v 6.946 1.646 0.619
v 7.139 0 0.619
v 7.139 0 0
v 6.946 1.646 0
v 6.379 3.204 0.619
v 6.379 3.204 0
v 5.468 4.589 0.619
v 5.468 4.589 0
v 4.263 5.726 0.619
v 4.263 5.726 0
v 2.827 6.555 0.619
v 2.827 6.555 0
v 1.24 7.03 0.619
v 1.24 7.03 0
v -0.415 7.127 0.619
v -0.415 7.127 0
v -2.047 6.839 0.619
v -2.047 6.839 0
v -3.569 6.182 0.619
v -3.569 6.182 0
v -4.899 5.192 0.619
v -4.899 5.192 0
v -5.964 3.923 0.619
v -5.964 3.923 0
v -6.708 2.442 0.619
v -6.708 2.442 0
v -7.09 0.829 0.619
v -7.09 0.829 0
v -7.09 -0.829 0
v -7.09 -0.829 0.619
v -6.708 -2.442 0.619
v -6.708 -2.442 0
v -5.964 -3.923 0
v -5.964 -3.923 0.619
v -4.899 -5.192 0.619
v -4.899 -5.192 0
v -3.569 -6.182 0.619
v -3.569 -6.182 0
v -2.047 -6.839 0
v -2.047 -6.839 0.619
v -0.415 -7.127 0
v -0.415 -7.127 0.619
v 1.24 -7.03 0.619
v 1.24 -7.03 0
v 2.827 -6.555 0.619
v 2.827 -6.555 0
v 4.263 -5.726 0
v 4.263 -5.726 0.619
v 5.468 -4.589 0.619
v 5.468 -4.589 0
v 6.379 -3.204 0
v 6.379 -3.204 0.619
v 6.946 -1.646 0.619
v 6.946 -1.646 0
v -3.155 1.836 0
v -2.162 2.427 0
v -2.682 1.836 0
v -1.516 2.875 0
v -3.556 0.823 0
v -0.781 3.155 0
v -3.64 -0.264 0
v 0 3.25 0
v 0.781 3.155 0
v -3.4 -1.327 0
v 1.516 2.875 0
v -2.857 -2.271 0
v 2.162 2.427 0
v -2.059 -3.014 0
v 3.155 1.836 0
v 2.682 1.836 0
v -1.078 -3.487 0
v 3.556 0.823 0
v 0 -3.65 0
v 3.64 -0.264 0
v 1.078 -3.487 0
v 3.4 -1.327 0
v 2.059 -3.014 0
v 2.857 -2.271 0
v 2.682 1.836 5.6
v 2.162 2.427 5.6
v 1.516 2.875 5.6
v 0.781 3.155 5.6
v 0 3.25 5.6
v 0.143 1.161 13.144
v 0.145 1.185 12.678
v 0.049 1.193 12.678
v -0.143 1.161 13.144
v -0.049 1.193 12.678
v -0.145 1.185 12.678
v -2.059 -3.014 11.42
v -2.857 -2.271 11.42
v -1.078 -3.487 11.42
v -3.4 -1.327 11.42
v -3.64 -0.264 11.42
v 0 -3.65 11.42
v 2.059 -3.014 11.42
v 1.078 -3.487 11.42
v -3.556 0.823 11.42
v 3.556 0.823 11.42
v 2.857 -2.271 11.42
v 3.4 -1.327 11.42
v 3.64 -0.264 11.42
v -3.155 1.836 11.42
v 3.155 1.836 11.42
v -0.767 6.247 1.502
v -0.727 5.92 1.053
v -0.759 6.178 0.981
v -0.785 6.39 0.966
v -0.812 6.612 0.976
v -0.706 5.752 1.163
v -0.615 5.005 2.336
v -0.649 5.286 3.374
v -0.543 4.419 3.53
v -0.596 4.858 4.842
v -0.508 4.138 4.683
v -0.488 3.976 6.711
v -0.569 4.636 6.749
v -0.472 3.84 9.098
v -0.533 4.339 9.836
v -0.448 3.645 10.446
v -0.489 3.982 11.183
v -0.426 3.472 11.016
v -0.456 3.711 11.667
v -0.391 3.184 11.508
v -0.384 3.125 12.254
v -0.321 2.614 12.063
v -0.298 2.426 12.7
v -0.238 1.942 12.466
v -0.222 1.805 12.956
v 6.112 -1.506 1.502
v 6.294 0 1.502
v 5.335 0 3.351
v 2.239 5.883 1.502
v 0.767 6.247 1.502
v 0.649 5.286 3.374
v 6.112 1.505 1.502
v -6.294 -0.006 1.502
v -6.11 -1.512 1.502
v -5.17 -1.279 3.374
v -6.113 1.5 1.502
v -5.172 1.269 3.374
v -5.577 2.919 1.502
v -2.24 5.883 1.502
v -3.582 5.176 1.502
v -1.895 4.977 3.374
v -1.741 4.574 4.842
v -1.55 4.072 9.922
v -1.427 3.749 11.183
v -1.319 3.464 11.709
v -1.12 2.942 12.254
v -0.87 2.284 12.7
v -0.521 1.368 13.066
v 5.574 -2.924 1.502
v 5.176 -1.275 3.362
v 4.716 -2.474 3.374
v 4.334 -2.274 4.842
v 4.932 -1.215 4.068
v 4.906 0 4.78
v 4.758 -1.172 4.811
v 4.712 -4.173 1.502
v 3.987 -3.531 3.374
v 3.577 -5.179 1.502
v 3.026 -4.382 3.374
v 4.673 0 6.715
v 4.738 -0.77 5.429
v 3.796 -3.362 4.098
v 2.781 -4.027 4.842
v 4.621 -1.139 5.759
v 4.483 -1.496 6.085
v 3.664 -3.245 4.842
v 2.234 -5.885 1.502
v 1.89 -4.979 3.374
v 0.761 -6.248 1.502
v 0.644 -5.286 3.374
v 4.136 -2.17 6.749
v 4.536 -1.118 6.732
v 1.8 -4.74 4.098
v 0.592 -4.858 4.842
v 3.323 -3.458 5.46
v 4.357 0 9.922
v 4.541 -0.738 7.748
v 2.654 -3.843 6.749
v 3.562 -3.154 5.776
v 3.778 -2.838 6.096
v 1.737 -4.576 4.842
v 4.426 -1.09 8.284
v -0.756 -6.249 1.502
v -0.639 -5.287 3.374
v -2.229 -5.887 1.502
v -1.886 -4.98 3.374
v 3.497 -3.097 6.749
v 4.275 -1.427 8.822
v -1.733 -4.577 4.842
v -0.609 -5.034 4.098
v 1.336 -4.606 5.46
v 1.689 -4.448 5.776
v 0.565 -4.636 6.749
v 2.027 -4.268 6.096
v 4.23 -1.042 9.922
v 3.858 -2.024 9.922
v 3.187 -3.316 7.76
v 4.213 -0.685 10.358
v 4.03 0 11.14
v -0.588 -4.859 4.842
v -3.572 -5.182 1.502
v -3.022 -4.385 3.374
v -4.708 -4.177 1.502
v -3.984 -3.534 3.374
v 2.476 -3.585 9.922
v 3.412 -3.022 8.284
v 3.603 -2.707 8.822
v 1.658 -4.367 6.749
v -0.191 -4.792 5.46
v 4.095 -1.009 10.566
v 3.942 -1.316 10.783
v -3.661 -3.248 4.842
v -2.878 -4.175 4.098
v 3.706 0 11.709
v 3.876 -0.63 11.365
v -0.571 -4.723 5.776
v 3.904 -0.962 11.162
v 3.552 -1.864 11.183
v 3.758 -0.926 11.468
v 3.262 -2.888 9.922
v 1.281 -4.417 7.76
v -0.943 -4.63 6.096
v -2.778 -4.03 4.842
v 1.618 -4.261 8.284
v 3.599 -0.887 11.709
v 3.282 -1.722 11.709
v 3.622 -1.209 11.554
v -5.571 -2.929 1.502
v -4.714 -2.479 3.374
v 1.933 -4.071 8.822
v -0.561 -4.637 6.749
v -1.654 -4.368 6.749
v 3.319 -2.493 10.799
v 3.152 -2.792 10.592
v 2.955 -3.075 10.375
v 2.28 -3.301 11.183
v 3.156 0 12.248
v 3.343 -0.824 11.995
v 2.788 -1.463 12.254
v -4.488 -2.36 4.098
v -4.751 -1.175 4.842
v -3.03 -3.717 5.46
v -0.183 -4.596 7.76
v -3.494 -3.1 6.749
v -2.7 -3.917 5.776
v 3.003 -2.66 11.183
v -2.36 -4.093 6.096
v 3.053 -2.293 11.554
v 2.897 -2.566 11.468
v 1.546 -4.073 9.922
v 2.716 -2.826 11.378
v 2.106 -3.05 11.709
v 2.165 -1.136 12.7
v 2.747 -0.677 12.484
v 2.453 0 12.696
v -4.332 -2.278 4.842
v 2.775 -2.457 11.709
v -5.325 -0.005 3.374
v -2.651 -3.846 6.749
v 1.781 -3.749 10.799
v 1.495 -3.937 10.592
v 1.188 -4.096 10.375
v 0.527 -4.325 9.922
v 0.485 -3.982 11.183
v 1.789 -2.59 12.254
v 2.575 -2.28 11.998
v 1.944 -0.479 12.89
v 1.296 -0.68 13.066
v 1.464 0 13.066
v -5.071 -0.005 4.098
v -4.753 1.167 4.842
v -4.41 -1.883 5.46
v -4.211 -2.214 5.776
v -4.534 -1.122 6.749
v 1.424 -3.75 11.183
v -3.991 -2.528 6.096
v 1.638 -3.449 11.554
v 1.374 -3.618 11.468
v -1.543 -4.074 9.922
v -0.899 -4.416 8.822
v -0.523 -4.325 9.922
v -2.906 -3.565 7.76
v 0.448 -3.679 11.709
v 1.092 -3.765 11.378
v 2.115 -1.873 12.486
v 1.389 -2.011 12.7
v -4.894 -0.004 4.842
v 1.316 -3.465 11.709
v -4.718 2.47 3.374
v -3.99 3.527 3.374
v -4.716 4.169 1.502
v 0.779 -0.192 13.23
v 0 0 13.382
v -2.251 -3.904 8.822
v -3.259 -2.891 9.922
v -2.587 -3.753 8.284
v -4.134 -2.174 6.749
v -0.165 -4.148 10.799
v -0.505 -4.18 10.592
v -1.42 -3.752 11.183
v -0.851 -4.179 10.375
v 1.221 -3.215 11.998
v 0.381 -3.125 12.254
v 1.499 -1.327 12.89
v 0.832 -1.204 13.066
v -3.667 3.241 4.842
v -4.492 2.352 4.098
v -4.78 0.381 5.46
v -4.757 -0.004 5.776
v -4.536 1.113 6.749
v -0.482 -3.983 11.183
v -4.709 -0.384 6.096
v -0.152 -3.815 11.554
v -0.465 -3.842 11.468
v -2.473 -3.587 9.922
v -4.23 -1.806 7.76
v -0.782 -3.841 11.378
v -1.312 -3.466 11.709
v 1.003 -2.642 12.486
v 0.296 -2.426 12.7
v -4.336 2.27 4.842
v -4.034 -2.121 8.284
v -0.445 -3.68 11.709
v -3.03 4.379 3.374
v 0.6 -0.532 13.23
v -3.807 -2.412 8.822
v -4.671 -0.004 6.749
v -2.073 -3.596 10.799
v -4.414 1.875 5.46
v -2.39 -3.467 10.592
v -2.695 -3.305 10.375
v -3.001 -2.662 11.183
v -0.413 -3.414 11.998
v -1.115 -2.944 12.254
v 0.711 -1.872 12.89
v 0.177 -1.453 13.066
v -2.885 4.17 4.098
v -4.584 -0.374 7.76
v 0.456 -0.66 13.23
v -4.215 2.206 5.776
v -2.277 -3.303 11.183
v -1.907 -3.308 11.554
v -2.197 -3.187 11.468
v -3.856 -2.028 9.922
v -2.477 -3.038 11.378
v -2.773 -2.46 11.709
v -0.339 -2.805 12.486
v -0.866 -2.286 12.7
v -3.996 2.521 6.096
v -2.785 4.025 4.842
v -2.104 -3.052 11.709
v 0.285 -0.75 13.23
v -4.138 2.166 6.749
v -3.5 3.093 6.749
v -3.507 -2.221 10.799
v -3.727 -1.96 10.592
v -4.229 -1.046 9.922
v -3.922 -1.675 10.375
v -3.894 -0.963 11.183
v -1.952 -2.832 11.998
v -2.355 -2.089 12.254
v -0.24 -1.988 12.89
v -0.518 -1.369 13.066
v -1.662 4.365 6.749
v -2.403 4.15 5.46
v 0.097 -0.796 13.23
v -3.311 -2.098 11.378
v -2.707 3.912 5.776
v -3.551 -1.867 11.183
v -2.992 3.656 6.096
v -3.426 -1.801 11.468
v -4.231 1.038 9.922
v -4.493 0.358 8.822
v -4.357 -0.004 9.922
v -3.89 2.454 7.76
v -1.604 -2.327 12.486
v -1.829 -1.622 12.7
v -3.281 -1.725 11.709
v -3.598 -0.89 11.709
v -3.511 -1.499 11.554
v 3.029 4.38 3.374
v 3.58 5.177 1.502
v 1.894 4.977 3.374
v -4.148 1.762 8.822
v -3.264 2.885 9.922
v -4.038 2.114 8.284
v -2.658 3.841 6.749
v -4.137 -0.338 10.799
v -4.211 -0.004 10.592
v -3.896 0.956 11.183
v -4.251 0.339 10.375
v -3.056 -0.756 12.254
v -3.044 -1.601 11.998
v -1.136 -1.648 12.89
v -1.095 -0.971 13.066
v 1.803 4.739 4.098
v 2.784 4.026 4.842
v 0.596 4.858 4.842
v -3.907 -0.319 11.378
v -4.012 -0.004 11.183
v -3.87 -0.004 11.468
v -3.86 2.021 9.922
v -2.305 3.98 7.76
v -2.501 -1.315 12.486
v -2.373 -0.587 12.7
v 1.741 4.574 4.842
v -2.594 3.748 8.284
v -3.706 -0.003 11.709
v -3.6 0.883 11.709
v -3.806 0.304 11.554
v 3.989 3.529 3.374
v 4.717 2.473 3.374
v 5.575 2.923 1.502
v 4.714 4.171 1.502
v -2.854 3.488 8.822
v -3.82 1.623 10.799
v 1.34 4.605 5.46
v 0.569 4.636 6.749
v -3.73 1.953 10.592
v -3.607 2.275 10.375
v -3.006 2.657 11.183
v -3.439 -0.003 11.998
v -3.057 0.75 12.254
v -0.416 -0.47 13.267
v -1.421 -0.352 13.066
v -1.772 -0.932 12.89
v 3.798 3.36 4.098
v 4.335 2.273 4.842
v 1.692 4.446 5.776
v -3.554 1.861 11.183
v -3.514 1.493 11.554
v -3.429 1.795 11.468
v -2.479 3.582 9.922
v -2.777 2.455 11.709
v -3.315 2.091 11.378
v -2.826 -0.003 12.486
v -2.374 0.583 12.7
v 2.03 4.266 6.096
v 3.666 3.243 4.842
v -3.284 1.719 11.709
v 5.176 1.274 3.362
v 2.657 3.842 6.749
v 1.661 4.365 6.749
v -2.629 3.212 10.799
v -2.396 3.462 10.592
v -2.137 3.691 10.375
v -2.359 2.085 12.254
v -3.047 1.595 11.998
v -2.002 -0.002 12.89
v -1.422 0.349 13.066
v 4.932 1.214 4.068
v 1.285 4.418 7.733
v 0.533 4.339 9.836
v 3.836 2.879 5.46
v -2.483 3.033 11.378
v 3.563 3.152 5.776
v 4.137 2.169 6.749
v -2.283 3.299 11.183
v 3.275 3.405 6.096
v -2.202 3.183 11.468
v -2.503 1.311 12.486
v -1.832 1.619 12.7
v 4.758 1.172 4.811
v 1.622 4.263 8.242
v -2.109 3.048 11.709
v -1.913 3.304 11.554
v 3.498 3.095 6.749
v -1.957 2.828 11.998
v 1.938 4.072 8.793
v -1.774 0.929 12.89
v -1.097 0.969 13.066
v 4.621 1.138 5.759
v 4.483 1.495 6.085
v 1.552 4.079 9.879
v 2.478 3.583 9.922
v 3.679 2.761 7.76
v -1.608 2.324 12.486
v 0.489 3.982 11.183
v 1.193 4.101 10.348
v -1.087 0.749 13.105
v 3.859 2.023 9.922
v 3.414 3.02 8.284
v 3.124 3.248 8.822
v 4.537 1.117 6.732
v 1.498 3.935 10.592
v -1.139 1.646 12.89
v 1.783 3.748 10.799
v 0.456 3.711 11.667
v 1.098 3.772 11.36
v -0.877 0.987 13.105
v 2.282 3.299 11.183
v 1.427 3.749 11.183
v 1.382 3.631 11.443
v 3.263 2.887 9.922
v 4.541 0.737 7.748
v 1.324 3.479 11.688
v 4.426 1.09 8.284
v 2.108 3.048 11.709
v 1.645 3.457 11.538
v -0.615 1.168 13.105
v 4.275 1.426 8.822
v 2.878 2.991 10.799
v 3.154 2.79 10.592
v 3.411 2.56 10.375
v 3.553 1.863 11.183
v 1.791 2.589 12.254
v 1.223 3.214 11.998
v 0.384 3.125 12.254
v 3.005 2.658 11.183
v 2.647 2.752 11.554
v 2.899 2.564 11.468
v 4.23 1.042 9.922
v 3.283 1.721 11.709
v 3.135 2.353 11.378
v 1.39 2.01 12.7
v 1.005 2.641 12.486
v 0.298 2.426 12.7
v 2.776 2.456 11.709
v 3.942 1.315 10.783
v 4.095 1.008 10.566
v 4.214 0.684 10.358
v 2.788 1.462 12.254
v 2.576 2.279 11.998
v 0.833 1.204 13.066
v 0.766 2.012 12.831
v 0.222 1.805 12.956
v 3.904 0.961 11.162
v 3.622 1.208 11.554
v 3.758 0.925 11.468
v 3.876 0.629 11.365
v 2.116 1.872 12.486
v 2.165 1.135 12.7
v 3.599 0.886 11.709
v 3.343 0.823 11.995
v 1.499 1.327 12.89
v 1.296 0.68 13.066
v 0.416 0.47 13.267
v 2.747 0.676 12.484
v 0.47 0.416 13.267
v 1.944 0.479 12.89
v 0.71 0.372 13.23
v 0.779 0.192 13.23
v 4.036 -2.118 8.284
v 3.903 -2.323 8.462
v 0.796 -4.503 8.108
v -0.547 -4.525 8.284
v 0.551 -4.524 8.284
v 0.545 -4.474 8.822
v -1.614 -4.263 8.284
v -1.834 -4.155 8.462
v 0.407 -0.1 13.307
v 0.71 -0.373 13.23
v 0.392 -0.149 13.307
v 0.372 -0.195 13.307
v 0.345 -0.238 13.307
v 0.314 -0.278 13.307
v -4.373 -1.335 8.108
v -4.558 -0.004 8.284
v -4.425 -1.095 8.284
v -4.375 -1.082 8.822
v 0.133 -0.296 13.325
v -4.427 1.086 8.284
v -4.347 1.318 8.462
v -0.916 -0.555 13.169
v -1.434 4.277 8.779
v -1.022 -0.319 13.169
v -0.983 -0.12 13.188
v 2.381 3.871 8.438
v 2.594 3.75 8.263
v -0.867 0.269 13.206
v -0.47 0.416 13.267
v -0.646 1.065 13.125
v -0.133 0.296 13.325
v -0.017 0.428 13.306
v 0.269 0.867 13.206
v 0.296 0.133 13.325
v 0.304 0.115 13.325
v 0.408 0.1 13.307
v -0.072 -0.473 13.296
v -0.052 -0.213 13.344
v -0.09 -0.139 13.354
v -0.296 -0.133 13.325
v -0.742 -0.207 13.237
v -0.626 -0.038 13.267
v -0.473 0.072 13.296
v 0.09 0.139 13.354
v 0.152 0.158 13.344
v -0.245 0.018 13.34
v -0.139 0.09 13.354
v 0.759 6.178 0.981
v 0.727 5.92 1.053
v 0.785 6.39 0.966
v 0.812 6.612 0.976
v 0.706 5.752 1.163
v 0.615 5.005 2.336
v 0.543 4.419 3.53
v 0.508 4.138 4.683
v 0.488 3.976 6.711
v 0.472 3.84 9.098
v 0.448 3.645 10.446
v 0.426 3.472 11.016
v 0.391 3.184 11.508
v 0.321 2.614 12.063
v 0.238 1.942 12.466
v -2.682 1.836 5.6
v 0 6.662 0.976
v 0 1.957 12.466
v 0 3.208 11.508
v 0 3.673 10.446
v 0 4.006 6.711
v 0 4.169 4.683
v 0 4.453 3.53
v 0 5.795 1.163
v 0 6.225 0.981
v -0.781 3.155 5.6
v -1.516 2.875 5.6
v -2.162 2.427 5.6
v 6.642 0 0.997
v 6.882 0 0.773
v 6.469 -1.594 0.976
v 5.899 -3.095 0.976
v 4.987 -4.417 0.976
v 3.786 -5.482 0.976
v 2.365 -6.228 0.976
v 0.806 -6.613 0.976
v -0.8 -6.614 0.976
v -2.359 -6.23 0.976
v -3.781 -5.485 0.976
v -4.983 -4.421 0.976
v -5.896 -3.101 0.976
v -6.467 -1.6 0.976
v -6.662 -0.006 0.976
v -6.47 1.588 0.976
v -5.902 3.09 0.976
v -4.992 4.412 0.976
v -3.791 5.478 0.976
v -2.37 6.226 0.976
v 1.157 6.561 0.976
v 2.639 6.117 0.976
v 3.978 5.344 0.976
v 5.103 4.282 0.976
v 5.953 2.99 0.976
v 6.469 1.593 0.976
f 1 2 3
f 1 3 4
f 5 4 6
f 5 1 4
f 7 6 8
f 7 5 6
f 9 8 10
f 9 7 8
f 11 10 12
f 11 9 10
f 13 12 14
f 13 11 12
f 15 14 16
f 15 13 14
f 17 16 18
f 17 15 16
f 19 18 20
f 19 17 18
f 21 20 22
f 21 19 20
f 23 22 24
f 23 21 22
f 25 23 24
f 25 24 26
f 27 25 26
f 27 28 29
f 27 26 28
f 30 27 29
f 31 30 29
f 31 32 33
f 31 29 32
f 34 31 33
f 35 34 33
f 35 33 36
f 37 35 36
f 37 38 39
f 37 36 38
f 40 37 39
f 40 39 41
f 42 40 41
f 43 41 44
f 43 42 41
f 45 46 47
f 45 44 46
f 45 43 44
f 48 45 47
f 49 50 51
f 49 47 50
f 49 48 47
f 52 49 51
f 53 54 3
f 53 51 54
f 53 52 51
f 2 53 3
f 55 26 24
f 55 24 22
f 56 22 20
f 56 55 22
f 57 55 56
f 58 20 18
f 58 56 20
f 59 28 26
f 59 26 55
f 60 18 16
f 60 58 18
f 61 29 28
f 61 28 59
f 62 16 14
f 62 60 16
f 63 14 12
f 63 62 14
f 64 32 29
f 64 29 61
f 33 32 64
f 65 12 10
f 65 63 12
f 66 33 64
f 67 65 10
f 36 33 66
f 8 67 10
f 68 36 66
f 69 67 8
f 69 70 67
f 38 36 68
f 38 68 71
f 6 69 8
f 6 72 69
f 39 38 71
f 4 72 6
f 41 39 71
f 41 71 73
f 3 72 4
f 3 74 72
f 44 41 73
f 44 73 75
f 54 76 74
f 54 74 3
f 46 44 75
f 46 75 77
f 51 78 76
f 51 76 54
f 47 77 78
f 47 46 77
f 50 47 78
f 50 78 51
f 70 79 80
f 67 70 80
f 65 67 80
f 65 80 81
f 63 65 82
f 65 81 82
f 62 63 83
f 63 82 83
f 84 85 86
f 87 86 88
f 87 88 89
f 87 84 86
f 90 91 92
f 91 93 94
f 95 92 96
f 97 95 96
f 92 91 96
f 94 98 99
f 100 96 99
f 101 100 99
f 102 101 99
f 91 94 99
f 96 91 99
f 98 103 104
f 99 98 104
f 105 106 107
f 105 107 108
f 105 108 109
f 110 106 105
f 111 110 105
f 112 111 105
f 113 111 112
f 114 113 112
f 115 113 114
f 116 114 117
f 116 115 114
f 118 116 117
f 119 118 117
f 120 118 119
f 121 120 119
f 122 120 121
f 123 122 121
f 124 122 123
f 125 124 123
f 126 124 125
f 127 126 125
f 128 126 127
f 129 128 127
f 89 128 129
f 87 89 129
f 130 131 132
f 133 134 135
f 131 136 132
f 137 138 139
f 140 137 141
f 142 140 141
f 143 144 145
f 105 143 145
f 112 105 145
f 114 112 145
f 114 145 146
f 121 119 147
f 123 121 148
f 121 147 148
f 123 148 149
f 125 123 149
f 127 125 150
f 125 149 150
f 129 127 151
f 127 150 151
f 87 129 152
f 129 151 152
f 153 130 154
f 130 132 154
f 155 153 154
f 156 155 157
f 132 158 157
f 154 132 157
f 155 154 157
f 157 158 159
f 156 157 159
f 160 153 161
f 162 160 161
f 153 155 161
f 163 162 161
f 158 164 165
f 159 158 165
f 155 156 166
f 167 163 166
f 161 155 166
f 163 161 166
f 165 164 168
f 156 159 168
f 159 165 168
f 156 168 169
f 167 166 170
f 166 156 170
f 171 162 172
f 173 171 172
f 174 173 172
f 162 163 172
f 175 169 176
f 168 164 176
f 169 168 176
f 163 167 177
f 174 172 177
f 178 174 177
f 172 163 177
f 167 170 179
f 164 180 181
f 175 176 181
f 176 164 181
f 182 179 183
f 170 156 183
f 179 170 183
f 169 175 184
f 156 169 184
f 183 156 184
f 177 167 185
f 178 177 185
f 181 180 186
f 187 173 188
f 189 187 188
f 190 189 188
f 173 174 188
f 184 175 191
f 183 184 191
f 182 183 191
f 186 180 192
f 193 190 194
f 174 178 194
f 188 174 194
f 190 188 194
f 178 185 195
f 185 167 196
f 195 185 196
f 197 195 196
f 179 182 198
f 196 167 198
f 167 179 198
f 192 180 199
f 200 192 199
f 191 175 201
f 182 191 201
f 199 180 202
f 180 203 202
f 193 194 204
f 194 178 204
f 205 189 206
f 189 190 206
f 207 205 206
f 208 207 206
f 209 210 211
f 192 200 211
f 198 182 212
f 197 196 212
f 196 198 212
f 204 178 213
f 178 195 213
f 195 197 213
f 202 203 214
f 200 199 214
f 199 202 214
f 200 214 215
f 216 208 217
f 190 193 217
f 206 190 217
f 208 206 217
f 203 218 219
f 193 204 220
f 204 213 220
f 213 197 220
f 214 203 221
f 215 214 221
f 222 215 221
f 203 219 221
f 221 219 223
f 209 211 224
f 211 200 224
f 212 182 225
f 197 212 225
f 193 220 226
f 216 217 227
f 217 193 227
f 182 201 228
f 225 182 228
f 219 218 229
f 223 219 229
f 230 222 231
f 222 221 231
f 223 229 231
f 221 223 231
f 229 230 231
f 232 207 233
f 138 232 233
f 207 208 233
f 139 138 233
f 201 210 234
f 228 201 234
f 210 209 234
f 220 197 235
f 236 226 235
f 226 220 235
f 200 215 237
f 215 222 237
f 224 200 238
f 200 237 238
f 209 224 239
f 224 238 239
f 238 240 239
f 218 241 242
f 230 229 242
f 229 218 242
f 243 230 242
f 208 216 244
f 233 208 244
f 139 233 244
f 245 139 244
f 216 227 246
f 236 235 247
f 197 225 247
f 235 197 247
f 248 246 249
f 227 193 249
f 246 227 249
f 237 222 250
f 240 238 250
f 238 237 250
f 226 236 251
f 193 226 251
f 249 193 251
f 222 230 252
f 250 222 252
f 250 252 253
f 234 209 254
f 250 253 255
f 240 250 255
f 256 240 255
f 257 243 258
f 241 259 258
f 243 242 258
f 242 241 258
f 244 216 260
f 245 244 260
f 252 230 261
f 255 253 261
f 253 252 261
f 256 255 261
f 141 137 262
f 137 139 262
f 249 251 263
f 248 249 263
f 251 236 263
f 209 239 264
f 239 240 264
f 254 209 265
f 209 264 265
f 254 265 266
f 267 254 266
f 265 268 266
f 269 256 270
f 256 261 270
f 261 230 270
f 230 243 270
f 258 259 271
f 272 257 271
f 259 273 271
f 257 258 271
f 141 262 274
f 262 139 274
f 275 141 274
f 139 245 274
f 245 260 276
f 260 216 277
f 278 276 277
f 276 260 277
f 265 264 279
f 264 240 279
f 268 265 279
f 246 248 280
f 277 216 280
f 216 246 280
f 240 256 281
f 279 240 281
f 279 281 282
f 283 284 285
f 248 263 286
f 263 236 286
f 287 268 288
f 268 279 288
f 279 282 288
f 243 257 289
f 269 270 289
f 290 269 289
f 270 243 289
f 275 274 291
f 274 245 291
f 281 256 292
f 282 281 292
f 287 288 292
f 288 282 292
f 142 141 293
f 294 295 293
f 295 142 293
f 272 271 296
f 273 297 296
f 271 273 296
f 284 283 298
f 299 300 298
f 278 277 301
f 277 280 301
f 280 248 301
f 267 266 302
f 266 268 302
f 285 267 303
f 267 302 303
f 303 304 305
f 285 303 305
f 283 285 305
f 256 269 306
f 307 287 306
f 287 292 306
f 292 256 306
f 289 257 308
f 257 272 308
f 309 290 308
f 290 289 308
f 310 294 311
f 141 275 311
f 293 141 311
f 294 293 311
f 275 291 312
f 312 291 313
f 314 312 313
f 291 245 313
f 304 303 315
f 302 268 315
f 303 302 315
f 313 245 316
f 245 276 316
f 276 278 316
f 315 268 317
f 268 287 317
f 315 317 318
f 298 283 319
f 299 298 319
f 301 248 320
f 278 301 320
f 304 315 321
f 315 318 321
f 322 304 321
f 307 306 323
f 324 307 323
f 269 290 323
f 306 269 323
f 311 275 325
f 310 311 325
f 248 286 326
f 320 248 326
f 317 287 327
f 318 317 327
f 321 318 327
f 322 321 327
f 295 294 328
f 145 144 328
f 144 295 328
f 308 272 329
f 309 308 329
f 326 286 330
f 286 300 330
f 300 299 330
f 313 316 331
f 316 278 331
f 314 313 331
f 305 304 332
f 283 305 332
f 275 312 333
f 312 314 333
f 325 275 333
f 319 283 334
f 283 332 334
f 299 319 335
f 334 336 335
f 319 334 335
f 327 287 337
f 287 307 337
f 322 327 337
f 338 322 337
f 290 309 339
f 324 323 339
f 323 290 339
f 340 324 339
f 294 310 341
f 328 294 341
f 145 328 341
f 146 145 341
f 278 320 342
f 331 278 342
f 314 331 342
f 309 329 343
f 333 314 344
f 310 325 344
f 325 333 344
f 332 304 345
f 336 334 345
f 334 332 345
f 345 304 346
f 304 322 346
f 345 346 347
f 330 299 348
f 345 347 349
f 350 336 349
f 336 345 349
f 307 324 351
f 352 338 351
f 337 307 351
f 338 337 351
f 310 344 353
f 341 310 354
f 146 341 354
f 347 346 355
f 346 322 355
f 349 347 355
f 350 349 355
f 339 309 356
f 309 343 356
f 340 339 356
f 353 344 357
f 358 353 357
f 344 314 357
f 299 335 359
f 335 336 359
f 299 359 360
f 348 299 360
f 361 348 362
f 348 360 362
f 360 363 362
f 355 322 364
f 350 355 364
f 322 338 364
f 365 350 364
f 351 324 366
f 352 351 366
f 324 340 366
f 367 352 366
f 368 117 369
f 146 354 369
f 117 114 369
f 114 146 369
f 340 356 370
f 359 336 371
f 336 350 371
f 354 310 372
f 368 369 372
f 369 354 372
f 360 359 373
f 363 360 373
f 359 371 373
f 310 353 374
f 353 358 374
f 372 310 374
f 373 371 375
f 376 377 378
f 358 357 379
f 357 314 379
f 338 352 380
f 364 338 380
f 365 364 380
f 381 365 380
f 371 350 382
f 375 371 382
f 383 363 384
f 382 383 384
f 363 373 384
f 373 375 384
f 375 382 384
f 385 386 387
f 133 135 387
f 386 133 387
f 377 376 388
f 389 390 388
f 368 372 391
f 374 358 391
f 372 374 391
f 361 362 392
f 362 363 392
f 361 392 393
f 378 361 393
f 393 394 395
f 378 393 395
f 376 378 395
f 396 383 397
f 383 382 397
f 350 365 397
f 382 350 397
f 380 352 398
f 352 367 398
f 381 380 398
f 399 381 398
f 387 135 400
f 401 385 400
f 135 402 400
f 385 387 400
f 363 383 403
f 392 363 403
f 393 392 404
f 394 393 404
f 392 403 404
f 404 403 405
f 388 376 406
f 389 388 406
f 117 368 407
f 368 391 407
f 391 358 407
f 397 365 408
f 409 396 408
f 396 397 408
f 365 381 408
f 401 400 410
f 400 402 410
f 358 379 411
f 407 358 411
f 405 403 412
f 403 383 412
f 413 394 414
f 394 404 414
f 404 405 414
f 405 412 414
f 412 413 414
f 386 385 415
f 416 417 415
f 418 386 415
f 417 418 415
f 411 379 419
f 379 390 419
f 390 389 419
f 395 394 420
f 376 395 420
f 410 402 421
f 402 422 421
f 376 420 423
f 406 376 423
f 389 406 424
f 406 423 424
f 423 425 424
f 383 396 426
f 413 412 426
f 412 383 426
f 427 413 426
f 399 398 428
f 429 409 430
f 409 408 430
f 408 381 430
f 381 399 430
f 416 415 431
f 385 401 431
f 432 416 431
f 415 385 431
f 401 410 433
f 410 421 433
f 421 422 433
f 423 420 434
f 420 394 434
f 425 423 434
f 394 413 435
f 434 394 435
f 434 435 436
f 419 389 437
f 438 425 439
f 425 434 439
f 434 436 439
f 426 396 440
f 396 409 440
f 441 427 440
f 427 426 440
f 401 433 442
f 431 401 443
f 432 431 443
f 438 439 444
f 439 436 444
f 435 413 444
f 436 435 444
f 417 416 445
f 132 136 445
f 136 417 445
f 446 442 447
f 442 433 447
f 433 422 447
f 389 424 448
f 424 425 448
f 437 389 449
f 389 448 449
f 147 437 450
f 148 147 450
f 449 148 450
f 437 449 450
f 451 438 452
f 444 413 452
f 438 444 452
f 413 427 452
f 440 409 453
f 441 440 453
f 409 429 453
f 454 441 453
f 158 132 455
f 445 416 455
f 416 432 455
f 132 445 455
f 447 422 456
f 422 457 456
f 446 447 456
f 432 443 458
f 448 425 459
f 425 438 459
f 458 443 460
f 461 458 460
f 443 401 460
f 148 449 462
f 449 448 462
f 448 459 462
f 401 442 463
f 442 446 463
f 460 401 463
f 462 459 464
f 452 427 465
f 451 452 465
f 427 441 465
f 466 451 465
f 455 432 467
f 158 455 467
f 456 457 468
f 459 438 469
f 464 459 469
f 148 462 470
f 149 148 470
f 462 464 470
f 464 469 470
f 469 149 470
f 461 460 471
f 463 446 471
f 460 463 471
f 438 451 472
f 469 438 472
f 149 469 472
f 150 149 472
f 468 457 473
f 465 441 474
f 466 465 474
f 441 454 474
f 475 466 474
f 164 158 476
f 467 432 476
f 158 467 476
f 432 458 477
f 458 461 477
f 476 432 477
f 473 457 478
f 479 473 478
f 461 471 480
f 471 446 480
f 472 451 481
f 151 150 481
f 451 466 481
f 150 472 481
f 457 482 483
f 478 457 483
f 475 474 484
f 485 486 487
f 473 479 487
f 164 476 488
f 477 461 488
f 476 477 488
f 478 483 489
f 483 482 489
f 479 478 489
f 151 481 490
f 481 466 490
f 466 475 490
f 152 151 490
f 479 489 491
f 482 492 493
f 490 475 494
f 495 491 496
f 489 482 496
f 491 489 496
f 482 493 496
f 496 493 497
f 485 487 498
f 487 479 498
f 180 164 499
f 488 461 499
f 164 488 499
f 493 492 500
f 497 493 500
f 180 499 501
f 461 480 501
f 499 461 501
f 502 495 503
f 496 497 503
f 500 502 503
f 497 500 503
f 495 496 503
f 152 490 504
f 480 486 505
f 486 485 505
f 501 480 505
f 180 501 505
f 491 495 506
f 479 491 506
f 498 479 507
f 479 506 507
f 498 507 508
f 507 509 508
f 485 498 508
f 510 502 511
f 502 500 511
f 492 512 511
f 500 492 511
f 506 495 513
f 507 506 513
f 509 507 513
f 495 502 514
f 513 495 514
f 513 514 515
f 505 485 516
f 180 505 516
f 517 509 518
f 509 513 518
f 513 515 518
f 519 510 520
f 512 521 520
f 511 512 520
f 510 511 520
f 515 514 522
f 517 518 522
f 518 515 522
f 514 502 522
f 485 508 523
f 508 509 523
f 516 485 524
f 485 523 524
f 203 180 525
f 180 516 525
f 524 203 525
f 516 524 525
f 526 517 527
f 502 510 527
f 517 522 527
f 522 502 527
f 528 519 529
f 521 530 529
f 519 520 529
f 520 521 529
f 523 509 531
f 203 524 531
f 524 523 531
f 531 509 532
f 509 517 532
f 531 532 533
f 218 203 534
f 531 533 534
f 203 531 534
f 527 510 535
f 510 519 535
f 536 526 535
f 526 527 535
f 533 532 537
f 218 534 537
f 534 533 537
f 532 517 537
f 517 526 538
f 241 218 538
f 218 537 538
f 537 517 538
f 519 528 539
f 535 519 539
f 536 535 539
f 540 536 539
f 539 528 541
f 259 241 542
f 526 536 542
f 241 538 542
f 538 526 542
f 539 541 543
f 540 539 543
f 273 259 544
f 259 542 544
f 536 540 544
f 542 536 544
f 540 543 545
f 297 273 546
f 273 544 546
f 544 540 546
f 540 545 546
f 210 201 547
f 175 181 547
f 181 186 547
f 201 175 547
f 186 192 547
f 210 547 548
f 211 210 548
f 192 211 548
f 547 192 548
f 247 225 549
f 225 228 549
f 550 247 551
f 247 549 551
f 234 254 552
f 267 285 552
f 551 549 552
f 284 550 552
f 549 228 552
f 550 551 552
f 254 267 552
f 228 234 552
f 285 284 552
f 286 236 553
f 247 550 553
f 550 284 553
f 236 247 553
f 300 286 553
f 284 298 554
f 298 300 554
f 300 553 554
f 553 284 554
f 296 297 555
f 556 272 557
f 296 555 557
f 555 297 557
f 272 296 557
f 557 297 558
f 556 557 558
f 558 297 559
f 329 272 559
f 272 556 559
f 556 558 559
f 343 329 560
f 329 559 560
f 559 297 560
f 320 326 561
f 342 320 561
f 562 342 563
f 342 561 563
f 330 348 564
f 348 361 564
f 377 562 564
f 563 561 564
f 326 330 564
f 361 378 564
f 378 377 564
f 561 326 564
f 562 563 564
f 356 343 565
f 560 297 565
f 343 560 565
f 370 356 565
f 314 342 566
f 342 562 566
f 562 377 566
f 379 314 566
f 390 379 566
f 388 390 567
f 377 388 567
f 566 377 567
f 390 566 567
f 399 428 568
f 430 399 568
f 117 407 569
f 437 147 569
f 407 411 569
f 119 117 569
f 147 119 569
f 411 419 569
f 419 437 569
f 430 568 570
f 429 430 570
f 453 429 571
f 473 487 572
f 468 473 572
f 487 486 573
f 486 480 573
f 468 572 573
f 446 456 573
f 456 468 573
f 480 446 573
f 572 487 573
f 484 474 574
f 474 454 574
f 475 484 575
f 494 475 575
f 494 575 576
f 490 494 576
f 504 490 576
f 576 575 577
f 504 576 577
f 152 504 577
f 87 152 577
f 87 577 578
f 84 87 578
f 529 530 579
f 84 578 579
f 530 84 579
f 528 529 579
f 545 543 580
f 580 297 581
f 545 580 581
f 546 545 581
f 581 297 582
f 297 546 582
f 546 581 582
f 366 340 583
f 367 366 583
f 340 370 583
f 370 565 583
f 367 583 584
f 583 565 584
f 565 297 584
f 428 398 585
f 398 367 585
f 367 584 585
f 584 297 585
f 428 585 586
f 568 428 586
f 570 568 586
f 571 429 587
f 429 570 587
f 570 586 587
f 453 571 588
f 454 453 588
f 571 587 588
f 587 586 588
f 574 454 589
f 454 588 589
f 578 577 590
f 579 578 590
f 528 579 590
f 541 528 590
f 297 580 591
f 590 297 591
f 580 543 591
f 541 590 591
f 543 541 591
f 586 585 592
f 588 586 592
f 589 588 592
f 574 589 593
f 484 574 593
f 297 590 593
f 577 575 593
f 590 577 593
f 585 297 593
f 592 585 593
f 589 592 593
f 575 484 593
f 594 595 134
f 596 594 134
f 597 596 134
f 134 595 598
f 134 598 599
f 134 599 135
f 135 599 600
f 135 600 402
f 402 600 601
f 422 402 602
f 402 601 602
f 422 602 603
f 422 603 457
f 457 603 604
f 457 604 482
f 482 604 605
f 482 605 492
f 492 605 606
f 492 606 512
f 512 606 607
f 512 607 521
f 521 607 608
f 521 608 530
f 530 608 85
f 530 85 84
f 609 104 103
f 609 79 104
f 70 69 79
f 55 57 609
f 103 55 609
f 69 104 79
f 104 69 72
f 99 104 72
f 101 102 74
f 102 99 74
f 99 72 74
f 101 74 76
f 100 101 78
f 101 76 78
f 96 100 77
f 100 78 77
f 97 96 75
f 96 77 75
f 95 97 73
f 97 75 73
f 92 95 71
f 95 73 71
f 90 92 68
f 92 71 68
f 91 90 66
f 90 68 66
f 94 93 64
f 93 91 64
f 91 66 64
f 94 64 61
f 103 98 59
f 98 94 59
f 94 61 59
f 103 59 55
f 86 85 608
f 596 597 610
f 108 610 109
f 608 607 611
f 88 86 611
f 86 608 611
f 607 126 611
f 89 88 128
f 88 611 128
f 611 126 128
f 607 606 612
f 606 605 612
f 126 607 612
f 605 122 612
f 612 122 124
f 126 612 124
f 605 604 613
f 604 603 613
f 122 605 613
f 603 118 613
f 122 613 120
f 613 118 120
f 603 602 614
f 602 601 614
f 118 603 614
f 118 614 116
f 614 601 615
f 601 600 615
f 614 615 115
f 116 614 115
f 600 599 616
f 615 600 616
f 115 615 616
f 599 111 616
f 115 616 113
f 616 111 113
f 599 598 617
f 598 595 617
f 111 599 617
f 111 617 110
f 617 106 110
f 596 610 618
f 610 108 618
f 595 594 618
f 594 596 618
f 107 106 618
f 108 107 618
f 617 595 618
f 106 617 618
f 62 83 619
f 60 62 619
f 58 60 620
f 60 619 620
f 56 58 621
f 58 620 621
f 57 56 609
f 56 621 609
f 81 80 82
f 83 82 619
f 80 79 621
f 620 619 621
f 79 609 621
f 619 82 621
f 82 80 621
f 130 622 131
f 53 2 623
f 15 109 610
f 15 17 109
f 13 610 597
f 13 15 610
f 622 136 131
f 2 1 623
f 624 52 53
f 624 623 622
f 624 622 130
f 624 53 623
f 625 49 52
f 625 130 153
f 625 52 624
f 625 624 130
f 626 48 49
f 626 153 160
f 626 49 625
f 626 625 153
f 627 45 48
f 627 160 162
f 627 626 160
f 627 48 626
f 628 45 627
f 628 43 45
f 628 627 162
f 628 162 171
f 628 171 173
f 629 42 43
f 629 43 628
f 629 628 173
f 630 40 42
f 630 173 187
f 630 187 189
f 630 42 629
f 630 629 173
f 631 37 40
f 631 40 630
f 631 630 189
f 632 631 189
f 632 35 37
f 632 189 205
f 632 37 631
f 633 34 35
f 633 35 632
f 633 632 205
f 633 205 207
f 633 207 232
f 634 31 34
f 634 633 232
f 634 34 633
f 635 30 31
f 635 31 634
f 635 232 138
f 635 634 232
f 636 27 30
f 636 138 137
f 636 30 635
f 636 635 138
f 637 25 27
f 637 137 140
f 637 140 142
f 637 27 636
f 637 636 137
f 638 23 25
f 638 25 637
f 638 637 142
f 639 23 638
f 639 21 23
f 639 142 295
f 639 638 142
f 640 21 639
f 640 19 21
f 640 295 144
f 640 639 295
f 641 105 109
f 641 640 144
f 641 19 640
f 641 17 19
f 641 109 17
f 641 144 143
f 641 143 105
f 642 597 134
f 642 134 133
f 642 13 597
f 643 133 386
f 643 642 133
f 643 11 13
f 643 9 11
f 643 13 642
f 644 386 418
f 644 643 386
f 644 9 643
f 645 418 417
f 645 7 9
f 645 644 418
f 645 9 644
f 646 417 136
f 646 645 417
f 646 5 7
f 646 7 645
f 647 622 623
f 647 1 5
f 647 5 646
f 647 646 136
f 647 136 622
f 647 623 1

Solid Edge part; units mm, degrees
sketch "Sketch1" plane through (0, 0, 0) normal (0, -1, 0) x (1, 0, 0)
  spline S0 degree 3 poles (6.2944, 1.5016) (5.9272, 2.184) (4.5913, 4.4109) (4.7659, 7.6806) (4.1548, 11.2638) (2.9653, 12.508) (2.0274, 13.0443) (0, 13.382) knots 0 0 0 0 0.152379 0.53247 0.706502 0.767416 1 1 1 1
  line L0 (0, 13.382) -> (0, 0)
  line L1 (0, 0) -> (7.1386, 0)
  line L2 (7.1386, 0) -> (7.1386, 0.6192)
  spline S1 degree 3 poles (6.2944, 1.5016) (6.5388, 1.0564) (6.8202, 0.7622) (7.1386, 0.6192) knots 0 0 0 0 1 1 1 1
revolve "RevolvedProtrusion1" add sketch "Sketch1" angle 360 about axis through (0, 0, 13.382) along (0, 0, -1)
sketch "Sketch2" plane through (0, 0, 0) normal (0, 0, -1) x (-1, 0, 0)
  line L0 (-3.1546, 1.8361) -> (3.1546, 1.8361)
  arc A0 (3.1546, 1.8361) -> (-3.1546, 1.8361) centre (0, 0) cw
extrude "Cutout1" cut sketch "Sketch2" against normal blind 11.42
sketch "Sketch3" plane through (0, 0, 0) normal (1, 0, 0) x (0, 1, 0)
  line L0 (4.2495, 14.0621) -> (1.6055, 13.785)
  line L1 (1.6055, 13.785) -> (1.3944, 13.2861)
  spline S0 degree 3 poles (1.1938, 12.6775) (1.1799, 12.7791) (1.1769, 12.9357) (1.1424, 13.2618) (1.3249, 13.2835) (1.3944, 13.2861) knots 0 0 0 0 0.371643 0.748001 1 1 1 1
  spline S1 degree 3 poles (1.1938, 12.6775) (1.4857, 12.6167) (2.0194, 12.4962) (2.7876, 11.9843) (3.4759, 11.2614) (3.7982, 10.006) (3.954, 8.1748) (4.0178, 5.9859) (4.256, 3.5573) (5.1648, 2.1521) (5.863, 0.9205) (6.4978, 0.9497) (6.8755, 0.9989) knots 0 0 0 0 0.056732 0.121413 0.187024 0.261384 0.385412 0.572864 0.72268 0.882372 0.927537 1 1 1 1
  line L2 (6.8755, 0.9989) -> (6.0925, 10.5194)
  line L3 (6.0925, 10.5194) -> (4.2495, 14.0621)
revolve "RevolvedCutout_4" cut sketch "Sketch3" angle 14 mid plane about axis through (0, 0, 0) along (0, 0, 1)
hole "Hole_1" at (0, 0, 0) direction (0, 0, 1) diameter 6.5 depth 5.6
